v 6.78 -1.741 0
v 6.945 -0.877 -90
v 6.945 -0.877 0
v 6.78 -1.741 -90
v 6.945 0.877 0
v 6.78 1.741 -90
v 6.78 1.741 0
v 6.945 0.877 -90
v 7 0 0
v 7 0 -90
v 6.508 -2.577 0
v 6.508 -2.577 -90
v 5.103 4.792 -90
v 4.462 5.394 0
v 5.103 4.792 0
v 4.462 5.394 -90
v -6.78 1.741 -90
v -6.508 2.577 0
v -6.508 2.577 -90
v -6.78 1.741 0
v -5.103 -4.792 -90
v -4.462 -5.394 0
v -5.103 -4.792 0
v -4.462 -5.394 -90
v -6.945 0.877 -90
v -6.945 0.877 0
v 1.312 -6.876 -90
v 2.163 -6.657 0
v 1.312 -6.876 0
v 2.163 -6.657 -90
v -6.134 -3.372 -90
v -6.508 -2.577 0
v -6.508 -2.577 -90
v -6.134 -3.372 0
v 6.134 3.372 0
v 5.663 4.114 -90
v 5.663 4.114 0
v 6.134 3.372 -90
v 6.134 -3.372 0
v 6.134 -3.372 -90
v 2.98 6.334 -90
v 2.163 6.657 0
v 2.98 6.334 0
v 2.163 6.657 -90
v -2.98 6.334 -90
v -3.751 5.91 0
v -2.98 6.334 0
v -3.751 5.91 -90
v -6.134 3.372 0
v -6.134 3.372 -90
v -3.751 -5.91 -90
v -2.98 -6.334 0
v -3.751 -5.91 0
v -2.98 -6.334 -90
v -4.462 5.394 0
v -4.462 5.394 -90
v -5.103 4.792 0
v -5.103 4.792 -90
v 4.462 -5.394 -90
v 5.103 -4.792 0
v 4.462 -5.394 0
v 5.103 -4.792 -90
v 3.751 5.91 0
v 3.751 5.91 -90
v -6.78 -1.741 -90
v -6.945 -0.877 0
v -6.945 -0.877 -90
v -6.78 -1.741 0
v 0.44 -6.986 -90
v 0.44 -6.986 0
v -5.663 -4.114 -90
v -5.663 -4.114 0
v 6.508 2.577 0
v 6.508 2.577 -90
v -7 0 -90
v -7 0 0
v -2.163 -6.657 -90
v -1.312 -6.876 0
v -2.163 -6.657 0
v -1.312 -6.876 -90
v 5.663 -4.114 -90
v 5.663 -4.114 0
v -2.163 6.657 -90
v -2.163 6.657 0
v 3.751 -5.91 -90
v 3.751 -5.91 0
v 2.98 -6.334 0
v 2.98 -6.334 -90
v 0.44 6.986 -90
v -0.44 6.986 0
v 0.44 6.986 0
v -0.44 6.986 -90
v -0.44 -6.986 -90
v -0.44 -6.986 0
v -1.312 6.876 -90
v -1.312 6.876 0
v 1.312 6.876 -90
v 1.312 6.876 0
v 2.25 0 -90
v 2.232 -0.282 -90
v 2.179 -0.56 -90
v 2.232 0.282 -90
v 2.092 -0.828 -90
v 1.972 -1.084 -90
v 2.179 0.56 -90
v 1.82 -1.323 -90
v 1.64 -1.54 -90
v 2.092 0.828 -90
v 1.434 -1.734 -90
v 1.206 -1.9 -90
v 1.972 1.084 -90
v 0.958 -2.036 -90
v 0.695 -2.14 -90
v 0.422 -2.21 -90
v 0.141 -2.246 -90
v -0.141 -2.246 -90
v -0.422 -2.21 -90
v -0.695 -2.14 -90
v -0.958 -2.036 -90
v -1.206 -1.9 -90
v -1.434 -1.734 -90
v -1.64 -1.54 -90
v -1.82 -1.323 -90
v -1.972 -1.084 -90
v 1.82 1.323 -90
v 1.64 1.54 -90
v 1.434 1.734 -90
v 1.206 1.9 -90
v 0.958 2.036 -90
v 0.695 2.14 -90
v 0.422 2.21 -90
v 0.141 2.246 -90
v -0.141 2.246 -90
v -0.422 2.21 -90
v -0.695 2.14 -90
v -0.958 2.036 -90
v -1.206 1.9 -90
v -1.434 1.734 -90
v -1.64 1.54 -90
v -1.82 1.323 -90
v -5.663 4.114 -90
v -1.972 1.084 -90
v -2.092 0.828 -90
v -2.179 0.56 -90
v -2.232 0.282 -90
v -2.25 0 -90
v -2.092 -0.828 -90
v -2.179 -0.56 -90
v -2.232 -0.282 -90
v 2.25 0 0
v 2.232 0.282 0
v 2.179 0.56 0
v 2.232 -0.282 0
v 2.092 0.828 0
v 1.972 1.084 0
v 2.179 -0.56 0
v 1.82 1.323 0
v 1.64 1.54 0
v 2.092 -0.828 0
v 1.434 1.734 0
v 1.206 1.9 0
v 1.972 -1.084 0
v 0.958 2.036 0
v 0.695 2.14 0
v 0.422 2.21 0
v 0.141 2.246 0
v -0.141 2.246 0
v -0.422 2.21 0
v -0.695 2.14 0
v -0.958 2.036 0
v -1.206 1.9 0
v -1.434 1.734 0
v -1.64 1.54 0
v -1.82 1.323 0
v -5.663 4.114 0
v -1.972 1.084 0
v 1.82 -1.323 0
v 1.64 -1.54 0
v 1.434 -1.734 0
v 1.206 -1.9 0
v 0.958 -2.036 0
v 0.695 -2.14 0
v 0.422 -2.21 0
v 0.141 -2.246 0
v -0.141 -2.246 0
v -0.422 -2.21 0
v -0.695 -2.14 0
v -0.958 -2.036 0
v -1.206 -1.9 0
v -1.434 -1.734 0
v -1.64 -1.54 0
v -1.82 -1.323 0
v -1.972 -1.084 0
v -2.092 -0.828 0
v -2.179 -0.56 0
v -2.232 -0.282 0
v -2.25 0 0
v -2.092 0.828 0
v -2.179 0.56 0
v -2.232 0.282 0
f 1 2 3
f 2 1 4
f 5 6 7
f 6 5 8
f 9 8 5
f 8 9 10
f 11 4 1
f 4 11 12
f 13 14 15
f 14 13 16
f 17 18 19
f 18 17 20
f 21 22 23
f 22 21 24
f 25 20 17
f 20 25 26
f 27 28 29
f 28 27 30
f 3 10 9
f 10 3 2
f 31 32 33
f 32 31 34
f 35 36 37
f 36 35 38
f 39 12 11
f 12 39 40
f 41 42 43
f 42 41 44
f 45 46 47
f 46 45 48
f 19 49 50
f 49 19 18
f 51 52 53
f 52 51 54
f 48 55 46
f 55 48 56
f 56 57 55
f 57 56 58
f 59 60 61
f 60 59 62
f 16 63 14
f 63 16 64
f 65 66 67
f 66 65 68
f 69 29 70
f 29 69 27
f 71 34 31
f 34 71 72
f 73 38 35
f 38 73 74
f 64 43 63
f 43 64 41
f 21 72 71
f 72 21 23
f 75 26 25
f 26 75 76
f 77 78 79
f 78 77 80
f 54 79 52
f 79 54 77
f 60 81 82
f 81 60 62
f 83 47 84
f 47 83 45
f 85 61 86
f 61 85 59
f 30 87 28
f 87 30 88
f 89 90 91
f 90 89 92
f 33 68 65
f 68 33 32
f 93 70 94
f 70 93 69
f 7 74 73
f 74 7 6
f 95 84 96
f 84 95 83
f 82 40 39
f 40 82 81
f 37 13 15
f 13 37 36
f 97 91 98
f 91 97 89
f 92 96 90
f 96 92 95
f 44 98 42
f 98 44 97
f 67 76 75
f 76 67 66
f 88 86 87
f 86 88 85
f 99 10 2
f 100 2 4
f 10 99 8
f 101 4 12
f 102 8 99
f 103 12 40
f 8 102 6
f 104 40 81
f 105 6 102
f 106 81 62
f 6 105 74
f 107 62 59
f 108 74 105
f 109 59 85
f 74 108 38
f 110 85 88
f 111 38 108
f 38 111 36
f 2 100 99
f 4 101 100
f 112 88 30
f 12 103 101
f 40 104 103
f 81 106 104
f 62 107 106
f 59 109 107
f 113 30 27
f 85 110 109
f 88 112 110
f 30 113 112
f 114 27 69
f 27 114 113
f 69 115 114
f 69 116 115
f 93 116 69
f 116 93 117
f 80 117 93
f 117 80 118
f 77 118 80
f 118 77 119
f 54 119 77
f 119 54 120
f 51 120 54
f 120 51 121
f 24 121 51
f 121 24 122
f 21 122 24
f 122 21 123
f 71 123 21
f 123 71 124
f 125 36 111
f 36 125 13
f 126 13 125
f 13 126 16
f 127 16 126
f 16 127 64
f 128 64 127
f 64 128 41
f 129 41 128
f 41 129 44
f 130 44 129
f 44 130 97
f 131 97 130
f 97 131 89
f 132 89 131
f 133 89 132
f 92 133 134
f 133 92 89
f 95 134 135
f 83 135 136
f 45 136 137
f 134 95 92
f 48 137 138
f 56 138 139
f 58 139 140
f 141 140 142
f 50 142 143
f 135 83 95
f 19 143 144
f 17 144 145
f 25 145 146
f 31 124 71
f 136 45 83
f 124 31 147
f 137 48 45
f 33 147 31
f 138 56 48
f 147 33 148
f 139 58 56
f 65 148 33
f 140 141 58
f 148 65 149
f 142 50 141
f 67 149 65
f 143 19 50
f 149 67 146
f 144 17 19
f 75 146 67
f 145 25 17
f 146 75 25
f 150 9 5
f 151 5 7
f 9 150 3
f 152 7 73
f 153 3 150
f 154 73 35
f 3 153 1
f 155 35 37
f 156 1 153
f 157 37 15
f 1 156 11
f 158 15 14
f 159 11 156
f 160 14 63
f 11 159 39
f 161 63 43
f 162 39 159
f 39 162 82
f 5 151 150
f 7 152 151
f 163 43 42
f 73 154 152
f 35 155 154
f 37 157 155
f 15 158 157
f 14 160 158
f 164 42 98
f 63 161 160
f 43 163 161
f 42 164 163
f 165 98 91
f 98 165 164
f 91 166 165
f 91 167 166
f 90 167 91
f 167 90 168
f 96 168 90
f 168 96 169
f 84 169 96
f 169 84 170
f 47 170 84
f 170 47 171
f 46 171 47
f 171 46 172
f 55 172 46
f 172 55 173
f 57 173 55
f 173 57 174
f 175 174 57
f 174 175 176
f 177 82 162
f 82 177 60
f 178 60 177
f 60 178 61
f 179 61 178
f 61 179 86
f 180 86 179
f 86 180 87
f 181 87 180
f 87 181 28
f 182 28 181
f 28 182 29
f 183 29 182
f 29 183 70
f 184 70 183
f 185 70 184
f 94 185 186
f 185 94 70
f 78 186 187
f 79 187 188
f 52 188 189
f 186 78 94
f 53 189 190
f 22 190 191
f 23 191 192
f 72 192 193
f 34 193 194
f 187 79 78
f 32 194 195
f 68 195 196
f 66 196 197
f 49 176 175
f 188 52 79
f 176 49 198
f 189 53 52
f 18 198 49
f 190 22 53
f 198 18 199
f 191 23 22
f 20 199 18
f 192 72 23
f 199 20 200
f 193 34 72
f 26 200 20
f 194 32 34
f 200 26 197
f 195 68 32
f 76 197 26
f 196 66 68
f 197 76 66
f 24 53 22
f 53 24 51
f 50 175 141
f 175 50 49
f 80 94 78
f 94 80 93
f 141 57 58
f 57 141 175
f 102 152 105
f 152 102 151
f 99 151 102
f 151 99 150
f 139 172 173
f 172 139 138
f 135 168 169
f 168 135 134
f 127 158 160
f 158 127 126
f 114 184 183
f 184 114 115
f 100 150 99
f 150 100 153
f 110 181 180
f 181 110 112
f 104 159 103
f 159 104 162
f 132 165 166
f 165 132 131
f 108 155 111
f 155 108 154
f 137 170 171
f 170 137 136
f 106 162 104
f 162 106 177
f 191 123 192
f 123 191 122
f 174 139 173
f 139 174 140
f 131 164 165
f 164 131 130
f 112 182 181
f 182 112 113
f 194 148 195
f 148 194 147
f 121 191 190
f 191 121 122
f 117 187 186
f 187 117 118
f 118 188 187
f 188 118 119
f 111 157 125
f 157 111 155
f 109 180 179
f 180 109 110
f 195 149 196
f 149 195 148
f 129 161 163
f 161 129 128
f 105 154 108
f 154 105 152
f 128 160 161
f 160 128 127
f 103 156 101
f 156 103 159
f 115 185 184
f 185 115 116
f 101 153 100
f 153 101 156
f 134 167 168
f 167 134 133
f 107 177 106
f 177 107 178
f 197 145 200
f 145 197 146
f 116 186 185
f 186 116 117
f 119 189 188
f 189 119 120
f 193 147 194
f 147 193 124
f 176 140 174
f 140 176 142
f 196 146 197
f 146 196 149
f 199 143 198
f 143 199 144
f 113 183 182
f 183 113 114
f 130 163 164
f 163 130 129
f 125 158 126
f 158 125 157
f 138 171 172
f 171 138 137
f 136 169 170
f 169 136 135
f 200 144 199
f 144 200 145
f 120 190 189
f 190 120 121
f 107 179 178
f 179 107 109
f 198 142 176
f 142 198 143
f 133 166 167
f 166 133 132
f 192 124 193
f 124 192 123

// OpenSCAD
$fn = 50;


difference() {
	union() {
		translate(v = [0, 0, -90.0000000000]) {
			cylinder(h = 90, r = 7.0000000000);
		}
		cylinder(h = 0, r = 13.0000000000);
	}
	union() {
		#translate(v = [0, 0, -90]) {
			cylinder(h = 90, r = 2.2500000000);
		}
	}
}
